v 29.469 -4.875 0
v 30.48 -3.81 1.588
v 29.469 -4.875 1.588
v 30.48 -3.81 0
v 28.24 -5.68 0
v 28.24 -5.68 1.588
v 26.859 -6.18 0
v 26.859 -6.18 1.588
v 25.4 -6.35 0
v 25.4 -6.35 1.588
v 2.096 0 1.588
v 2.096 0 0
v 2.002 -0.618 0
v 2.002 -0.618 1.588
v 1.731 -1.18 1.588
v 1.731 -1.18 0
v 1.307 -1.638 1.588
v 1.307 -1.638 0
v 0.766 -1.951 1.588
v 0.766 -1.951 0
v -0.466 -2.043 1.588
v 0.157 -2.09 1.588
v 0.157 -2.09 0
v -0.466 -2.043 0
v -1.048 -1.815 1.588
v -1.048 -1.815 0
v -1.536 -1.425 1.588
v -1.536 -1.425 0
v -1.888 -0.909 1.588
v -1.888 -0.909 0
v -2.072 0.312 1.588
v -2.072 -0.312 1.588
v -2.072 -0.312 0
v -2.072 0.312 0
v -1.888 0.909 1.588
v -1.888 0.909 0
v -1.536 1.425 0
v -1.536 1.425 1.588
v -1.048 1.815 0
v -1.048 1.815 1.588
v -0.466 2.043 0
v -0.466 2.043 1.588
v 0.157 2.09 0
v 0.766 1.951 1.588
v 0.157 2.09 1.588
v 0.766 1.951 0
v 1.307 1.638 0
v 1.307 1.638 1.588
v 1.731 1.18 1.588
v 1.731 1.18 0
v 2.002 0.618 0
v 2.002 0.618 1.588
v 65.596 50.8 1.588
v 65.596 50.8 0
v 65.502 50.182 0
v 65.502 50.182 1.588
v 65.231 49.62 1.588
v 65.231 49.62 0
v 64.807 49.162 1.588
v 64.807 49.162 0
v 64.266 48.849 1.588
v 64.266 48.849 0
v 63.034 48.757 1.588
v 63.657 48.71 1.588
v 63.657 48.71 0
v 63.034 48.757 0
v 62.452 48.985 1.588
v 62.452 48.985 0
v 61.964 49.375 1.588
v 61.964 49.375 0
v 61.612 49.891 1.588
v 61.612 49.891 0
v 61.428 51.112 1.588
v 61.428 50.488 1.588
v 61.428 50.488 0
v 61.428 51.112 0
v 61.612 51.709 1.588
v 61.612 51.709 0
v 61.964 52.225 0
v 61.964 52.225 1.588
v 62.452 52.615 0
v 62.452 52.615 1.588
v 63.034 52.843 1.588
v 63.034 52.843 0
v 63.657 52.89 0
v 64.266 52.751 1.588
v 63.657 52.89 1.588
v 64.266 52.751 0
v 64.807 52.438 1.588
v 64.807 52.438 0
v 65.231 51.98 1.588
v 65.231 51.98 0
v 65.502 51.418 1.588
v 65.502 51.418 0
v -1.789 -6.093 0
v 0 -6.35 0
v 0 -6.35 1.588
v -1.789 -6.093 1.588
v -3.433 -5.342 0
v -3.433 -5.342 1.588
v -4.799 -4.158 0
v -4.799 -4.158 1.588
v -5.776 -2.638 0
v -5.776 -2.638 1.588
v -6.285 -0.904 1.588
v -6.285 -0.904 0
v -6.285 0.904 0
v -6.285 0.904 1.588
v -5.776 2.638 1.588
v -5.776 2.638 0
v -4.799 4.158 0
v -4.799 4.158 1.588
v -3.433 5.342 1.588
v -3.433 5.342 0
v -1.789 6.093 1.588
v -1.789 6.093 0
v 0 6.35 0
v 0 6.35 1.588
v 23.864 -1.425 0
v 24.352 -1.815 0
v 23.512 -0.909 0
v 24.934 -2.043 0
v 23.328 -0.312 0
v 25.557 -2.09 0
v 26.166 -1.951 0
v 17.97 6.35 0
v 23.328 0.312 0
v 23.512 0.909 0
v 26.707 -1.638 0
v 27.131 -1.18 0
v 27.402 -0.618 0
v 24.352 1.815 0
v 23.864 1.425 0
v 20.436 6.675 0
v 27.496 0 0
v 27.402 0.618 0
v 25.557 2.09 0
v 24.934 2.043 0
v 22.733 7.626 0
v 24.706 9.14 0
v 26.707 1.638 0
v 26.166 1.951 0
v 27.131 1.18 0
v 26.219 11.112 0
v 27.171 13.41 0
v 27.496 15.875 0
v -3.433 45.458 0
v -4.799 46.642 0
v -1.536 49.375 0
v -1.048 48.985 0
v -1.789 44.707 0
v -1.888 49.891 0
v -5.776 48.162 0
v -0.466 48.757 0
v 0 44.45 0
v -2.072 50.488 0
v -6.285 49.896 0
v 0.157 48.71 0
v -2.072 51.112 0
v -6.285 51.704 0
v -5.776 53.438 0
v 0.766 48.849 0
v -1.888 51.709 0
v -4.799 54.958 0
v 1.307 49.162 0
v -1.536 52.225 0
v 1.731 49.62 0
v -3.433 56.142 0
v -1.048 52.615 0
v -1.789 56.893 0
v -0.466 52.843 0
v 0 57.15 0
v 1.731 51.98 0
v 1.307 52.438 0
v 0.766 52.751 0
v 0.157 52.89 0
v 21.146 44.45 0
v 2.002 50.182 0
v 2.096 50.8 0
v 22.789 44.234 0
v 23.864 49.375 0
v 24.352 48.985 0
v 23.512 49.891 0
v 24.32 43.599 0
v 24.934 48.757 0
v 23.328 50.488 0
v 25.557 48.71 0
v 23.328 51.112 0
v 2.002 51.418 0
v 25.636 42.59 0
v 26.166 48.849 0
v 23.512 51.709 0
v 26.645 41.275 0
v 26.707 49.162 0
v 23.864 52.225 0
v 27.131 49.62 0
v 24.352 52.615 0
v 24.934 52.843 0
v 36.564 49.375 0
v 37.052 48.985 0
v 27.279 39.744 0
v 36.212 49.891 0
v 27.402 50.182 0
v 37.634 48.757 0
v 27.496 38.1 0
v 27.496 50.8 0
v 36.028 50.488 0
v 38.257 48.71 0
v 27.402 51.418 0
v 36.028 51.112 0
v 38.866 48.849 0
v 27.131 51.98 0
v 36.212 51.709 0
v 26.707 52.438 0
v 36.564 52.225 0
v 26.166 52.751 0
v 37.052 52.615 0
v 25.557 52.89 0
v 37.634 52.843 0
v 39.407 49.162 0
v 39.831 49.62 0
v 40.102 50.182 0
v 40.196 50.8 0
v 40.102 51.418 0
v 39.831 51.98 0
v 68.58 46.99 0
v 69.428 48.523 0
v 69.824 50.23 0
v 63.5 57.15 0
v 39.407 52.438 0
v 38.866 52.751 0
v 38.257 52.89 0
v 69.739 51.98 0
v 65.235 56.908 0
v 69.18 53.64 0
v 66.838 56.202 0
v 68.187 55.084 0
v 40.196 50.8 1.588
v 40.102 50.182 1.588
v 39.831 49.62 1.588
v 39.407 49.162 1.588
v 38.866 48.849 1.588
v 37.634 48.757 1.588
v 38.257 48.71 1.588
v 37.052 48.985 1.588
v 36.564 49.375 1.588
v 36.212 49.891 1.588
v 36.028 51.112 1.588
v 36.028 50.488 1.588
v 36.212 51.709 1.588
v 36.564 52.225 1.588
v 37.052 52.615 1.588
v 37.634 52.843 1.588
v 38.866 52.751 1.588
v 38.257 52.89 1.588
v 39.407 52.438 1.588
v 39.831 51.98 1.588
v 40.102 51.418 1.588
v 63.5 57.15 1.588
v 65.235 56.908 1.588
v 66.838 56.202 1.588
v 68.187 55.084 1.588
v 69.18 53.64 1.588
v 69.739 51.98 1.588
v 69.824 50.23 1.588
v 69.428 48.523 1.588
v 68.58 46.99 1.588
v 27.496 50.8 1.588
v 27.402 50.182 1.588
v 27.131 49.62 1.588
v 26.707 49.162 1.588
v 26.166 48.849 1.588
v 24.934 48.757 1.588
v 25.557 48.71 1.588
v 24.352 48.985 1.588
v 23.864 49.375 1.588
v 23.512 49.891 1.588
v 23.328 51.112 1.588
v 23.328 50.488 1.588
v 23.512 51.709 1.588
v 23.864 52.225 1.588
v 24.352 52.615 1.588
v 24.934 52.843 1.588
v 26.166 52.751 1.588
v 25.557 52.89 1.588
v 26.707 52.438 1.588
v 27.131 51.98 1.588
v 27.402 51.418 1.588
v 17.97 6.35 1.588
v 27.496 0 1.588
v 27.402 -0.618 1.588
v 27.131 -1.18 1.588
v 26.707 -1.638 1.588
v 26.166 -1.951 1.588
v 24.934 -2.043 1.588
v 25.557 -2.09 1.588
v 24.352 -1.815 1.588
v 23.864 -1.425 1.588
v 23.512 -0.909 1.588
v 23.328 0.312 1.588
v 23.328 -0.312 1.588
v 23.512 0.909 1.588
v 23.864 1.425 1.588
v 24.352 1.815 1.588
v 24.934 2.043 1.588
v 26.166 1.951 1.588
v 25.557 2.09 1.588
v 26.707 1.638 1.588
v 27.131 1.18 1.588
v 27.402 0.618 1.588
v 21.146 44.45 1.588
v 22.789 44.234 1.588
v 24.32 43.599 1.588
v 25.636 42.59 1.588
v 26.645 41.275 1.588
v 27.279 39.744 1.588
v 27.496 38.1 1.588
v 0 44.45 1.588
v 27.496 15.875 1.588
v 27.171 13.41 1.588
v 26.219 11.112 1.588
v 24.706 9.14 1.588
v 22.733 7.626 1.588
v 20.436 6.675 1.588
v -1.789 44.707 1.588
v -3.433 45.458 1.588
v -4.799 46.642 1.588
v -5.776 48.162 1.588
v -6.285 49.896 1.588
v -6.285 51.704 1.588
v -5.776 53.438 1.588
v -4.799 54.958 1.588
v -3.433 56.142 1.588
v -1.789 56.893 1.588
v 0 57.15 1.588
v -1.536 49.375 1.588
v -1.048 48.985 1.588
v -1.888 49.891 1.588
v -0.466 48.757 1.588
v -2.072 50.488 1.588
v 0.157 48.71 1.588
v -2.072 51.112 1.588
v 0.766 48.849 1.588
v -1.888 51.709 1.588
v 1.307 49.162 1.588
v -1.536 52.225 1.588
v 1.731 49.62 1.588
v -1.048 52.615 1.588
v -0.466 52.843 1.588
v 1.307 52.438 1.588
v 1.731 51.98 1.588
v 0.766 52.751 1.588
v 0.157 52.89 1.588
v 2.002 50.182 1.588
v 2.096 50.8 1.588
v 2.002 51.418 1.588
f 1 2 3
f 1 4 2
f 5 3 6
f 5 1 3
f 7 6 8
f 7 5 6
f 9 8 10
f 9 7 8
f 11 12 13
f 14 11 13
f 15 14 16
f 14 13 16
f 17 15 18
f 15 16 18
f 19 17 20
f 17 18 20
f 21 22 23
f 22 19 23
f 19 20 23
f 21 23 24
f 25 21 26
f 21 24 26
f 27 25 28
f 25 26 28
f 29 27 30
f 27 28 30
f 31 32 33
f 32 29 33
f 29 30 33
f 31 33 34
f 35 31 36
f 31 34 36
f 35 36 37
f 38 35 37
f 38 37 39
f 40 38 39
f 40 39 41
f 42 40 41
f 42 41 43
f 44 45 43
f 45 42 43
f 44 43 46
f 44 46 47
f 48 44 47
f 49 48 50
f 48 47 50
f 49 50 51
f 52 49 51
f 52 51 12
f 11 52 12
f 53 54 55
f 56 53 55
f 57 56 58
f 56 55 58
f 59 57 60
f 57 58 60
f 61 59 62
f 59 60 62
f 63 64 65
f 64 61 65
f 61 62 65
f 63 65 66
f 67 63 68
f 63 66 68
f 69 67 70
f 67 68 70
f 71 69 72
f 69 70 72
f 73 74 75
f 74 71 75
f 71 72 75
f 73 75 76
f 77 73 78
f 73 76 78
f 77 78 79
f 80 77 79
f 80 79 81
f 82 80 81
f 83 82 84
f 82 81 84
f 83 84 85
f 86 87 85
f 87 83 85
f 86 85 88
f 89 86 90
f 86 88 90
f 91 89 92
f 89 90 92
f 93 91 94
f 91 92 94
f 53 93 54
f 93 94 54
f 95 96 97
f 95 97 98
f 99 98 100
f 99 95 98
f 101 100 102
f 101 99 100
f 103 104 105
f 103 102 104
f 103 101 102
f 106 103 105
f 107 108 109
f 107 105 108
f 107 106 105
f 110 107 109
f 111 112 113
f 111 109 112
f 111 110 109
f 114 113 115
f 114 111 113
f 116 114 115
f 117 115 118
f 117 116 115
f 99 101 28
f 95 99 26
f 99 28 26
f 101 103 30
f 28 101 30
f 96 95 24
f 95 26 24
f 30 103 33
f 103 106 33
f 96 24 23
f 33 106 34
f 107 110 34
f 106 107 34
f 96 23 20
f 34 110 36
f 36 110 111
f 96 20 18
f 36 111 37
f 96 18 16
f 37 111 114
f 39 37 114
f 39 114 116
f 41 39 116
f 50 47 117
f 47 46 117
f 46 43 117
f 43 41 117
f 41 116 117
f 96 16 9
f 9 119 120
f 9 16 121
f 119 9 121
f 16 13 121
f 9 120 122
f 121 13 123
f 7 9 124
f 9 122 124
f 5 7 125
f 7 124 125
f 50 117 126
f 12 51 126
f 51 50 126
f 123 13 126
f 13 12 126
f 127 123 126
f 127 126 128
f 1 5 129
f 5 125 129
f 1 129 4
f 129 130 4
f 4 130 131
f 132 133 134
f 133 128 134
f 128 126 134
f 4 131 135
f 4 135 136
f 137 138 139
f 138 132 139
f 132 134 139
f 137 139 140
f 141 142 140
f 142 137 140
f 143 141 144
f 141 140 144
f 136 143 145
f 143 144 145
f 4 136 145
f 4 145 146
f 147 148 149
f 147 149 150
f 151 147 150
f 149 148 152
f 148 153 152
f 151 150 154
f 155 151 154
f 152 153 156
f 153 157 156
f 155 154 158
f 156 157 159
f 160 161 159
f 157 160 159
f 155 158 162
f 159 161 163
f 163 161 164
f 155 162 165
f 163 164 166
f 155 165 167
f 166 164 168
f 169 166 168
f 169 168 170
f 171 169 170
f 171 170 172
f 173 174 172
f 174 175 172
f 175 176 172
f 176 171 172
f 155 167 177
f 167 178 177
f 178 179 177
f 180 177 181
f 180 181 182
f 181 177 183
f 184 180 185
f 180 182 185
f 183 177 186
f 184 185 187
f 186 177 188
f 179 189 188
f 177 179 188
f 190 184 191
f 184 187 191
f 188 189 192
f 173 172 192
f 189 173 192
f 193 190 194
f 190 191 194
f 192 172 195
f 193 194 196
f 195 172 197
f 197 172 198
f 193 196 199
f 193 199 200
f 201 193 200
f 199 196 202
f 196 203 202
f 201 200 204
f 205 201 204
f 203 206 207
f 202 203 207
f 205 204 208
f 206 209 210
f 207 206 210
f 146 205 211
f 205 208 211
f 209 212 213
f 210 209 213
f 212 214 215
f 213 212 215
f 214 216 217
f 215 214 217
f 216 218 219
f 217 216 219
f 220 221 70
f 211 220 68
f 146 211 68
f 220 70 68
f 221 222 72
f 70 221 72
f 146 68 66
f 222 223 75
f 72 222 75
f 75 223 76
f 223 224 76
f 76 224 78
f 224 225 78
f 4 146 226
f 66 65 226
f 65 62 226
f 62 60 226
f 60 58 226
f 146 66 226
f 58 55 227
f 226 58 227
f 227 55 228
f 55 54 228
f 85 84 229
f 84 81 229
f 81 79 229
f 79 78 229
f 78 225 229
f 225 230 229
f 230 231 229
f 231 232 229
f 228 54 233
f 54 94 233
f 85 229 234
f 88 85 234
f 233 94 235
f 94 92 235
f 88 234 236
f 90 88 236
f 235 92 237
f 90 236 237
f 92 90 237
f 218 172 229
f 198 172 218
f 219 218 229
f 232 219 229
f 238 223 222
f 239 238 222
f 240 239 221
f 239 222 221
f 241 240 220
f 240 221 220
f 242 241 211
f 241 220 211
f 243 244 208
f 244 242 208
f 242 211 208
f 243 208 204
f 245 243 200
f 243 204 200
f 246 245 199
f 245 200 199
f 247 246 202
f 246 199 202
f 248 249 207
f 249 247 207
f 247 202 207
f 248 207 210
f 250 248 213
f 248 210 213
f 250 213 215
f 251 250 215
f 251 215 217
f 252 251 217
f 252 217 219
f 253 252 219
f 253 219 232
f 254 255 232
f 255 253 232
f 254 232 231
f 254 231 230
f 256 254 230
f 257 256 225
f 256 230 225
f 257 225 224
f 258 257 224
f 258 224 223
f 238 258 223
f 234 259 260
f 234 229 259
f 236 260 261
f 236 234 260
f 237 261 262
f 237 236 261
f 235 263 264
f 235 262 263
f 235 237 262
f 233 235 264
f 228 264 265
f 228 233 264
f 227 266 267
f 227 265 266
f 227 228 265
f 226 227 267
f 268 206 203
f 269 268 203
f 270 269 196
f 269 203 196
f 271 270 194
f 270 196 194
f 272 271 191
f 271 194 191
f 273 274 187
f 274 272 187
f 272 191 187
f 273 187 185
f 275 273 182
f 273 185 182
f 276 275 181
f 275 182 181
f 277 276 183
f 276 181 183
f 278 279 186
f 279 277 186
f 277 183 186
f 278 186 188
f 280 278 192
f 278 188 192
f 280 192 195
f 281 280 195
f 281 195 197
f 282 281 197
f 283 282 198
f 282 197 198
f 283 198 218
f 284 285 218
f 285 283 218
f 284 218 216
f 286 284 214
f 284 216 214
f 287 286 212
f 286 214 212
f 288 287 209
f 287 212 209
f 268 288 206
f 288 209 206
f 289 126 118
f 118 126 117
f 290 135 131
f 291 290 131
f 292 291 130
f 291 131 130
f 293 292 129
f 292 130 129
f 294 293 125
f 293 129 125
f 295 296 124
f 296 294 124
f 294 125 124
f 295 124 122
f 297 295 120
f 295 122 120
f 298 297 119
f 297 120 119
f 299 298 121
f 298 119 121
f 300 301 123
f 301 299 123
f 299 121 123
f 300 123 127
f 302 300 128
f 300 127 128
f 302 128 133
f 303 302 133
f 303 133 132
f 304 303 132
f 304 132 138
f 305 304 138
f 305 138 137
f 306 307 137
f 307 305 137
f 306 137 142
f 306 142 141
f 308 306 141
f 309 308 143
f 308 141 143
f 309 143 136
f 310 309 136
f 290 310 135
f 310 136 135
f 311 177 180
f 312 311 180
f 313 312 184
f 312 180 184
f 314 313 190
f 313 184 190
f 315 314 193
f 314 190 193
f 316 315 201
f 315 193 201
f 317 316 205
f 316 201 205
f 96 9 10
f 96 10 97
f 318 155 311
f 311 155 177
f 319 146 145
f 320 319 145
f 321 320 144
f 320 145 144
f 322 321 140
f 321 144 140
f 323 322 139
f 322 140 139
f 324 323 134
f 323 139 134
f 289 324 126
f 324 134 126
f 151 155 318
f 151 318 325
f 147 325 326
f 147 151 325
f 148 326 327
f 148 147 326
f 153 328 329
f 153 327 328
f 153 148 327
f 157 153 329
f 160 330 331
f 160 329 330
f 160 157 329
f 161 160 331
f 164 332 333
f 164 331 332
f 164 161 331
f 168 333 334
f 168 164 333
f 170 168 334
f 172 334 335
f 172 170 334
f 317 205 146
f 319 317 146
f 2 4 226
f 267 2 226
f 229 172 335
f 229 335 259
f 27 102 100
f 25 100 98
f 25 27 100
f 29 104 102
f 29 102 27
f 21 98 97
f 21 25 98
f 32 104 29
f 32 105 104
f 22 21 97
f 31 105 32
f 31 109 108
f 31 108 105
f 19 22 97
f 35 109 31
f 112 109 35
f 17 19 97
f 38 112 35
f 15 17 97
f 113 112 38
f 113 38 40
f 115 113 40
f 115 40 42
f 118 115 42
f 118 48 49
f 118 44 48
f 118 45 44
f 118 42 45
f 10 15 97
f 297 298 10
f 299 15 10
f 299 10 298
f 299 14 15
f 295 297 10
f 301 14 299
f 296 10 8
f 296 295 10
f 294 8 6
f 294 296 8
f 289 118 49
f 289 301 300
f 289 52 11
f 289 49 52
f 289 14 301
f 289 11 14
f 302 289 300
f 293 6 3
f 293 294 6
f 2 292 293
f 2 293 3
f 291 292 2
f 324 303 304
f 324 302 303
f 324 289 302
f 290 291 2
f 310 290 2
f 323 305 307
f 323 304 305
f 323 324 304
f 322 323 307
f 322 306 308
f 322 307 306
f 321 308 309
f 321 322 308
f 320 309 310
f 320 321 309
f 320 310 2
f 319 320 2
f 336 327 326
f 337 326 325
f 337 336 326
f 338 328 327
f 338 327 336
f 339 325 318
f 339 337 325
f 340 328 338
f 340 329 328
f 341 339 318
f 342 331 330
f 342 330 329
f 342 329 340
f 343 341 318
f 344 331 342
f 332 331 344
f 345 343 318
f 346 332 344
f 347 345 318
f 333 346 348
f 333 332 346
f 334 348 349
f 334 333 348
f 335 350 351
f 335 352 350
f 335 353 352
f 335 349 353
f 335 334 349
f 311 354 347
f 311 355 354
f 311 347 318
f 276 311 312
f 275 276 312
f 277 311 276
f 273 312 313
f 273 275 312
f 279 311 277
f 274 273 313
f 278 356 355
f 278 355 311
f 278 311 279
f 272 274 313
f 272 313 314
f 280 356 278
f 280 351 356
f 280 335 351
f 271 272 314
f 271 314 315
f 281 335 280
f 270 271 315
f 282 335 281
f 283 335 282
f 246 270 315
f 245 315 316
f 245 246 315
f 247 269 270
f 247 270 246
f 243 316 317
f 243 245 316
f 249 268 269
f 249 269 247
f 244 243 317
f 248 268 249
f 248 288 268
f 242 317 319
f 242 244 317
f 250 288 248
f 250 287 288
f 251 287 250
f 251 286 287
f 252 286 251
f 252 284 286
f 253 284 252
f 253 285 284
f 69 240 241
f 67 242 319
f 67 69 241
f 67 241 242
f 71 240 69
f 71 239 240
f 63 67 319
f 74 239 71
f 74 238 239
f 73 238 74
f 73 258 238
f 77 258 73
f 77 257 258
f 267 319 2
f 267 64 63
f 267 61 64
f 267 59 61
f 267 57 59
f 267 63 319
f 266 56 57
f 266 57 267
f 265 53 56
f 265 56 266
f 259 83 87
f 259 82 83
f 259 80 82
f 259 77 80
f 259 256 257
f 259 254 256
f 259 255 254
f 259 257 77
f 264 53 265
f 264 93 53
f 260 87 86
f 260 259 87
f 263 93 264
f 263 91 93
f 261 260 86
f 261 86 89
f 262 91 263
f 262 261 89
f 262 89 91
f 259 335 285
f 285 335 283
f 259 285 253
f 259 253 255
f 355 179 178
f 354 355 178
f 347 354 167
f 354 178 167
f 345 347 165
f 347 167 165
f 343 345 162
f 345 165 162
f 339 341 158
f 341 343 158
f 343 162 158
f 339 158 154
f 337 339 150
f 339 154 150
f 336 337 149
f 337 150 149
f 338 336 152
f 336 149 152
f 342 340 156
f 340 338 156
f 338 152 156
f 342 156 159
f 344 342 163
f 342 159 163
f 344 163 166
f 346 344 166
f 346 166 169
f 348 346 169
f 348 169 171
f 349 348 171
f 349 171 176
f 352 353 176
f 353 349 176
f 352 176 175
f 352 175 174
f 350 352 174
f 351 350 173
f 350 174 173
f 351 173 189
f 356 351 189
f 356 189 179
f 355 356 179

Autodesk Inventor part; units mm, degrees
ref_plane "YZ Plane" through (0, 0, 0) normal (1, 0, 0) x (0, 1, 0)
ref_plane "XZ Plane" through (0, 0, 0) normal (0, 1, 0) x (-1, 0, 0)
ref_plane "XY Plane" through (0, 0, 0) normal (0, 0, 1) x (1, 0, 0)
sketch "main" plane through (0, 0, 0) normal (0, 0, 1) x (1, 0, 0)
  circle A0 centre (-8.7196, -23.7408) radius 2.0955
  circle A1 centre (-34.1196, -23.7408) radius 2.0955
  arc A2 (-34.1196, -17.3908) -> (-34.1196, -30.0908) centre (-34.1196, -23.7408) ccw
  arc A3 (-16.1491, -17.3908) -> (-6.6241, -7.8658) centre (-16.1491, -7.8658) ccw
  arc A4 (-8.7196, -30.0908) -> (-3.6396, -27.5508) centre (-8.7196, -23.7408) ccw
  line L0 (-16.1491, -17.3908) -> (-34.1196, -17.3908)
  line L1 (-8.7196, -30.0908) -> (-34.1196, -30.0908)
  circle A5 centre (-8.7196, 27.0592) radius 2.0955
  circle A6 centre (-34.1196, 27.0592) radius 2.0955
  arc A7 (-34.1196, 33.4092) -> (-34.1196, 20.7092) centre (-34.1196, 27.0592) ccw
  line L2 (-6.6241, 14.3592) -> (-6.6241, -7.8658)
  line L3 (-34.1196, 20.7092) -> (-12.9741, 20.7092)
  arc A8 (-6.6241, 14.3592) -> (-12.9741, 20.7092) centre (-12.9741, 14.3592) ccw
  line L4 (-3.6396, -27.5508) -> (34.4604, 23.2492)
  line L5 (-34.1196, 33.4092) -> (29.3804, 33.4092)
  line L6 (-6.6241, 20.7092) -> (15.6009, 20.7092) construction
  circle A9 centre (3.9804, 27.0592) radius 2.0955
  circle A10 centre (29.3804, 27.0592) radius 2.0955
  arc A11 (34.4604, 23.2492) -> (29.3804, 33.4092) centre (29.3804, 27.0592) ccw
  point P0 (-9.3122, 5.0882)
  dimension "d0" = 4.191
  dimension "d1" = 4.191
  dimension "d2" = 4.191
  dimension "d3" = 4.191
  dimension "d4" = 9.525
  dimension "d5" = 6.35
sketch "Sketch1" plane through (0, 0, 0) normal (0, 0, 1) x (1, 0, 0)
  circle A0 centre (25.4, 0) radius 2.0955
  circle A1 centre (0, 0) radius 2.0955
  arc A2 (0, 6.35) -> (0, -6.35) centre (0, 0) ccw
  arc A3 (17.9705, 6.35) -> (27.4955, 15.875) centre (17.9705, 15.875) ccw
  arc A4 (25.4, -6.35) -> (30.48, -3.81) centre (25.4, 0) ccw
  line L0 (17.9705, 6.35) -> (0, 6.35)
  line L1 (25.4, -6.35) -> (0, -6.35)
  circle A5 centre (25.4, 50.8) radius 2.0955
  circle A6 centre (0, 50.8) radius 2.0955
  arc A7 (0, 57.15) -> (0, 44.45) centre (0, 50.8) ccw
  line L2 (27.4955, 38.1) -> (27.4955, 15.875)
  line L3 (0, 44.45) -> (21.1455, 44.45)
  arc A8 (27.4955, 38.1) -> (21.1455, 44.45) centre (21.1455, 38.1) ccw
  line L4 (30.48, -3.81) -> (68.58, 46.99)
  line L5 (0, 57.15) -> (63.5, 57.15)
  line L6 (27.4955, 44.45) -> (49.7205, 44.45) construction
  circle A9 centre (38.1, 50.8) radius 2.0955
  circle A10 centre (63.5, 50.8) radius 2.0955
  arc A11 (68.58, 46.99) -> (63.5, 57.15) centre (63.5, 50.8) ccw
extrude "Extrusion1" add sketch "Sketch1" along normal blind 1.5875
properties part number "gusset" material "Acetal Resin, White"
